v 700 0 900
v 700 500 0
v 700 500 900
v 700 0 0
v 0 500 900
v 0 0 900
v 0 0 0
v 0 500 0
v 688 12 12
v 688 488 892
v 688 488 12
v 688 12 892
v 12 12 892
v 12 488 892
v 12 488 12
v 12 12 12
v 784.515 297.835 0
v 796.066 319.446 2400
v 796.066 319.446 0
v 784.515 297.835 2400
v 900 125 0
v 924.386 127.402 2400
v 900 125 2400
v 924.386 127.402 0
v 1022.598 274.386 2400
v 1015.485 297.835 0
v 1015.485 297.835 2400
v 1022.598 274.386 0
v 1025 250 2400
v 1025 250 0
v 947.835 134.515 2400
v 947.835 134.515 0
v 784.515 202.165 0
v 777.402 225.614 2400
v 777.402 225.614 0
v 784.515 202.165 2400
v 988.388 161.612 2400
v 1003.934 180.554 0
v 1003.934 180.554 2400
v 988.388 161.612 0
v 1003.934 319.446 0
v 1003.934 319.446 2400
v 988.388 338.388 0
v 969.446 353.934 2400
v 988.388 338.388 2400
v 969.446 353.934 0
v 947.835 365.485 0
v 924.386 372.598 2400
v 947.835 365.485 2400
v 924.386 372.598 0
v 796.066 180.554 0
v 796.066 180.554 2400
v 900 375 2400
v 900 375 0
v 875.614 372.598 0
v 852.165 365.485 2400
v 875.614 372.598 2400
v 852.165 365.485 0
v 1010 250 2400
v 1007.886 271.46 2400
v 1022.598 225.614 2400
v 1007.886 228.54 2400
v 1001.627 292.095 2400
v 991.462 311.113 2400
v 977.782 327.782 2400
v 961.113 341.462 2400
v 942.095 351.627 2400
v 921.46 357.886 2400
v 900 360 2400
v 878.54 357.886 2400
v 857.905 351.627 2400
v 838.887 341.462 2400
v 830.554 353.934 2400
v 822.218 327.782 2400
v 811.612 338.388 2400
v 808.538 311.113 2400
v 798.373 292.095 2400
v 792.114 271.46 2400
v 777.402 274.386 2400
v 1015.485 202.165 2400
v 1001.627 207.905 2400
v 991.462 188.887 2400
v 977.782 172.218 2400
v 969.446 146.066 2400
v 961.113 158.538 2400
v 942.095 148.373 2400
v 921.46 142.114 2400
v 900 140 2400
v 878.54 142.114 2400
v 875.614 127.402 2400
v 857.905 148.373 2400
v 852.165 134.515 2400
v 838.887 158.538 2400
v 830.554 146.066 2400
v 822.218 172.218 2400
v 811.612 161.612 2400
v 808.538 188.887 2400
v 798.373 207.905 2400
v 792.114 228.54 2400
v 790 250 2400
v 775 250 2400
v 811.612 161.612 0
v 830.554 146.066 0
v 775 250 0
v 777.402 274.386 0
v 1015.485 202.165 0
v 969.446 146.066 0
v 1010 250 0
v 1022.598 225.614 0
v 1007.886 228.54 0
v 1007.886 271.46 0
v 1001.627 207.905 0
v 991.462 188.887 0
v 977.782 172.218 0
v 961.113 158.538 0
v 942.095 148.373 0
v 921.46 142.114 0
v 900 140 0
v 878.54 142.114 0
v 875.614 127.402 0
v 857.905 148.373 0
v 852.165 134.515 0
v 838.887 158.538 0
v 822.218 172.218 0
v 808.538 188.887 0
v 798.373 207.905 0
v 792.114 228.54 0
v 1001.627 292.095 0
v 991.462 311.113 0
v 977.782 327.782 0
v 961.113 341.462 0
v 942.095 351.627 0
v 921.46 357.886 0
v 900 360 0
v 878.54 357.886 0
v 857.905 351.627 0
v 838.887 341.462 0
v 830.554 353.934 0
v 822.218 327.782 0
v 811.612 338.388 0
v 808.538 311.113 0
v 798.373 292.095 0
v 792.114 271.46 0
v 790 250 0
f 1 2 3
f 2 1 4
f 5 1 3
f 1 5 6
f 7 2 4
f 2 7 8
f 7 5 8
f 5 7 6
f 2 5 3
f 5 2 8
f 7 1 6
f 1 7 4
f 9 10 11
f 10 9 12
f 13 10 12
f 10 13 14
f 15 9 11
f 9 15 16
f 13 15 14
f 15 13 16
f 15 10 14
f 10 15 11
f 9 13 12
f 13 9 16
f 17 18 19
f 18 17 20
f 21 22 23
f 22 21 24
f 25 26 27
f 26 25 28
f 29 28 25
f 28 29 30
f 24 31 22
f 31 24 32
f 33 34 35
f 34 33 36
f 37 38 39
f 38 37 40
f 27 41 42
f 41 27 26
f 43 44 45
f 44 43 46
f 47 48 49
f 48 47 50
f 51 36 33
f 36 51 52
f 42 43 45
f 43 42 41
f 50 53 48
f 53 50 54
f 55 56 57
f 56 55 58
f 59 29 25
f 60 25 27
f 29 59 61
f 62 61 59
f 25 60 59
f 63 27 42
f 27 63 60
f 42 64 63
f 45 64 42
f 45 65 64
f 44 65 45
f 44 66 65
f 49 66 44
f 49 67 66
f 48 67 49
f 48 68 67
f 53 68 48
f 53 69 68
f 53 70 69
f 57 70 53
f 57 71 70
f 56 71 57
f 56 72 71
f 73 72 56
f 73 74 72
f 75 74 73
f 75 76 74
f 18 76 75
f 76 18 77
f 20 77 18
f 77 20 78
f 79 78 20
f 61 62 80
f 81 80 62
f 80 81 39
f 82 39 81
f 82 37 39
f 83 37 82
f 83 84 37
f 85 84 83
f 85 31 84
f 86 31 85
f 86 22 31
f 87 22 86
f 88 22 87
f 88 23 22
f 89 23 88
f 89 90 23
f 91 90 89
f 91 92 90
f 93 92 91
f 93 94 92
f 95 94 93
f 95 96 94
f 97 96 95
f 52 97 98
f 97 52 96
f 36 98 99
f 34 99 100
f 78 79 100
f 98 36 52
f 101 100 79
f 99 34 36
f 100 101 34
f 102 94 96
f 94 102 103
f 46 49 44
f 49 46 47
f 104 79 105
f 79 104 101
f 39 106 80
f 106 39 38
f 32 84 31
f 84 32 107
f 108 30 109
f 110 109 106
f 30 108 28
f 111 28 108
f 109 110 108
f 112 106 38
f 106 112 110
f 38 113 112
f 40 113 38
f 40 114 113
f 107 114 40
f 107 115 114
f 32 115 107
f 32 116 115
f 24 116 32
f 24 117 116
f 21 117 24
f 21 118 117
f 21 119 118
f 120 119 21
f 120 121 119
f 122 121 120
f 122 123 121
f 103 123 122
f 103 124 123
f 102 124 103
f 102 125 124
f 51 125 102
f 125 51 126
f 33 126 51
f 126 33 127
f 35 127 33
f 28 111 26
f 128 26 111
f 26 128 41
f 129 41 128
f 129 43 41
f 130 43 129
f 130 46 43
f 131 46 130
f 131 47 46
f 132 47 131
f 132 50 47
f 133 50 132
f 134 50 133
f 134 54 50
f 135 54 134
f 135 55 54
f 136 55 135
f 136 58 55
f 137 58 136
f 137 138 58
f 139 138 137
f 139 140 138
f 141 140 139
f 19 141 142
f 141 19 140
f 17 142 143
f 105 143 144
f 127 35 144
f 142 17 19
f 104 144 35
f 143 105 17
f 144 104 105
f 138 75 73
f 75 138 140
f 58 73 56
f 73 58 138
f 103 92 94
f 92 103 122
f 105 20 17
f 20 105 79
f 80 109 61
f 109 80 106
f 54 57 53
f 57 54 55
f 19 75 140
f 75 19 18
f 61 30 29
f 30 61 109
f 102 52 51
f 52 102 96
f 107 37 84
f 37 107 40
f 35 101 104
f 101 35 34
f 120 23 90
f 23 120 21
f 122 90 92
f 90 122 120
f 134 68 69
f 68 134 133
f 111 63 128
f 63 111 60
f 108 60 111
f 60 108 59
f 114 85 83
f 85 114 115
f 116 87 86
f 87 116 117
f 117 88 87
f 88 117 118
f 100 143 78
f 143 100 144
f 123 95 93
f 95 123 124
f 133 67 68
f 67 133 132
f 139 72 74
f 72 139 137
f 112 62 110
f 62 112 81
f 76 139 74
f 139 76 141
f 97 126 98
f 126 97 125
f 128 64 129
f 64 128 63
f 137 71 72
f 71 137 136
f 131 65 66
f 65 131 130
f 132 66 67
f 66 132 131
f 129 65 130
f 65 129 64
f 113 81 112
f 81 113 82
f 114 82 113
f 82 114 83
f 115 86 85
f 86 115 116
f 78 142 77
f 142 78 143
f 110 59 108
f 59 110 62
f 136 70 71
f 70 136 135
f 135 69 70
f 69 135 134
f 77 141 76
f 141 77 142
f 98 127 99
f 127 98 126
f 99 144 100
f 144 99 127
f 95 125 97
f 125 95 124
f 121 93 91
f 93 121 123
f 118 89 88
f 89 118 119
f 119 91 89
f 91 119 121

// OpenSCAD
// file: ../params.scad
// Shared millimetre parameters. Keep in lockstep with freecad/params.py.
// Module scale: 150 kg/day wet train. Walls are CPVC sheet, not metal.

$fn = 36;

WALL        = 12;     // CPVC sheet thickness
FLOOR       = 16;     // floor plate (trough sits on this)

// LEACH CSTR 1 — inside liquor box
CSTR_L      = 2000;
CSTR_W      = 1200;
CSTR_H      = 1400;   // liquid + freeboard
FREEBOARD   = 200;

// CSTR 2 weir (same vessel, +X wall)
WEIR_W      = 450;
WEIR_CREST  = CSTR_H - FREEBOARD;   // from inner floor
WEIR_SLOT_H = 80;
WEIR_LIP    = 120;    // external spout projection

// CSTR 3 floor auger — injection-molded PVC / FG
AUGER_D     = 140;    // flight OD
AUGER_SHAFT = 40;
AUGER_PITCH = 110;
AUGER_TROUGH_W = 180;
AUGER_TROUGH_H = 110;
AUGER_OFFSET_Y = 280; // trough centreline from inner -Y wall
AUGER_INCLINE  = 28;  // deg, lifts out of liquor toward +X

// mixer / nozzles (lid)
MIXER_D     = 50;
GAS_D       = 80;     // acid-gas takeoff
DROP_X      = 80;     // inner-X of shred drop slot
DROP_L      = 400;
DROP_W      = 250;
DROP_COAM   = 80;     // raised coaming around the slot

// LEACHATE PUMP / coarse strainer — −X wall, opposite the weir
PUMP_D      = 80;     // DN80
PUMP_Z      = 450;    // centreline above inner floor (submerged)
PUMP_Y      = 900;    // centreline from inner −Y (away from auger)
STRAINER_L  = 180;
STRAINER_W  = 140;
STRAINER_H  = 160;

// mezzanine feed train
MEZZ_H      = 2200;   // platform top above tank outer floor
MEZZ_L      = 1600;   // platform length in −X
MEZZ_THK    = 12;
HOPPER_L    = 700;
HOPPER_W    = 600;
HOPPER_H    = 800;
SHRED_L     = 500;
SHRED_W     = 500;
SHRED_H     = 450;
CONV_W      = 240;
CONV_H      = 120;
CONV_PLATE  = 6;      // trough plate
CONV_FLANGE = 40;
CONV_SPRING_D = 50;
CONV_SPRING_H = 80;
CONV_BOLT   = 10;     // M10 clearance
CONV_LEN    = 1800;   // default standalone length; plant instance is computed
DUST_D      = 150;    // dust-hood outlet to DUST header
AUGER_LIFT_L = 700;

// dewater belts + split (Phase A 4–6)
FDEW_L      = 1800;
FDEW_W      = 450;
FDEW_H      = 80;
FDEW_RISE   = 120;    // solids end higher so liquor runs back to weir
SDEW_L      = 1400;
SDEW_W      = 220;
SDEW_H      = 80;
SPLIT_L     = 600;
SPLIT_W     = 500;
SPLIT_H     = 400;
STUB_L      = 400;
STUB_W      = 300;
STUB_H      = 250;

// EW funnel cell
EW_L        = 600;    // along aisle (overflow direction)
EW_W        = 420;    // anode-cathode depth
EW_H        = 650;    // rectangular body
EW_FUNNEL_H = 220;
EW_VALVE_D  = 50;
EW_VALVE_L  = 60;
EW_MEM_T    = 4;      // CEM
EW_SLOT     = 10;     // membrane cassette slot
EW_PITCH    = 750;    // aisle spacing, centre to centre
AISLE_X0    = 200;
AISLE_Y     = -(EW_W + 2*WALL) - 400;
AISLE_Z     = 400;
BUND_H      = 150;
BUND_PAD    = 250;
SUMP_L      = 400;
SUMP_W      = 400;
SUMP_H      = 300;
VDF_D       = 700;
VDF_L       = 900;
PAIL_W      = 180;
HDR_D       = 80;
HDR_Z       = 1400;
PYRO_D      = 320;
PYRO_L      = 2800;

// Campus envelopes — lockstep with freecad/params.py
FARM_X=12000; FARM_Y=8000; FARM_L=12000; FARM_W=8000; FARM_H=4500;
FAB_X=12000;  FAB_Y=-6000; FAB_L=8000;   FAB_W=6000;  FAB_H=4000;
HAB_X=-8000;  HAB_Y=8000;  HAB_L=8000;   HAB_W=6000;  HAB_H=3200;
CRYO_X=-6000; CRYO_Y=-4000; CRYO_L=4000; CRYO_W=3000; CRYO_H=3000;
MFG_X=2000;   MFG_Y=9000;  MFG_L=6000;   MFG_W=4000;  MFG_H=3500;

LIFE_Z_GREY=900; LIFE_Z_UPW=1100; LIFE_Z_ETCH=1300;
LIFE_Z_O2=2800; LIFE_Z_N2=3000; LIFE_Z_CO2=3200;
LIFE_D_GREY=50; LIFE_D_UPW=40; LIFE_D_ETCH=32;
LIFE_D_GAS=25; LIFE_D_CO2=40;
// main file
// 8.3 H2_DRYER + stack. Not tied to oil vapor.
include <../params.scad>;
$fn = 32;

module mfg_h2_dryer() {
    difference() {
        cube([700, 500, 900]);
        translate([12, 12, 12]) cube([676, 476, 880]);
    }
    translate([900, 250, 0])
        difference() {
            cylinder(h=2400, d=250);
            translate([0, 0, -1]) cylinder(h=2402, d=220);
        }
}
mfg_h2_dryer();
